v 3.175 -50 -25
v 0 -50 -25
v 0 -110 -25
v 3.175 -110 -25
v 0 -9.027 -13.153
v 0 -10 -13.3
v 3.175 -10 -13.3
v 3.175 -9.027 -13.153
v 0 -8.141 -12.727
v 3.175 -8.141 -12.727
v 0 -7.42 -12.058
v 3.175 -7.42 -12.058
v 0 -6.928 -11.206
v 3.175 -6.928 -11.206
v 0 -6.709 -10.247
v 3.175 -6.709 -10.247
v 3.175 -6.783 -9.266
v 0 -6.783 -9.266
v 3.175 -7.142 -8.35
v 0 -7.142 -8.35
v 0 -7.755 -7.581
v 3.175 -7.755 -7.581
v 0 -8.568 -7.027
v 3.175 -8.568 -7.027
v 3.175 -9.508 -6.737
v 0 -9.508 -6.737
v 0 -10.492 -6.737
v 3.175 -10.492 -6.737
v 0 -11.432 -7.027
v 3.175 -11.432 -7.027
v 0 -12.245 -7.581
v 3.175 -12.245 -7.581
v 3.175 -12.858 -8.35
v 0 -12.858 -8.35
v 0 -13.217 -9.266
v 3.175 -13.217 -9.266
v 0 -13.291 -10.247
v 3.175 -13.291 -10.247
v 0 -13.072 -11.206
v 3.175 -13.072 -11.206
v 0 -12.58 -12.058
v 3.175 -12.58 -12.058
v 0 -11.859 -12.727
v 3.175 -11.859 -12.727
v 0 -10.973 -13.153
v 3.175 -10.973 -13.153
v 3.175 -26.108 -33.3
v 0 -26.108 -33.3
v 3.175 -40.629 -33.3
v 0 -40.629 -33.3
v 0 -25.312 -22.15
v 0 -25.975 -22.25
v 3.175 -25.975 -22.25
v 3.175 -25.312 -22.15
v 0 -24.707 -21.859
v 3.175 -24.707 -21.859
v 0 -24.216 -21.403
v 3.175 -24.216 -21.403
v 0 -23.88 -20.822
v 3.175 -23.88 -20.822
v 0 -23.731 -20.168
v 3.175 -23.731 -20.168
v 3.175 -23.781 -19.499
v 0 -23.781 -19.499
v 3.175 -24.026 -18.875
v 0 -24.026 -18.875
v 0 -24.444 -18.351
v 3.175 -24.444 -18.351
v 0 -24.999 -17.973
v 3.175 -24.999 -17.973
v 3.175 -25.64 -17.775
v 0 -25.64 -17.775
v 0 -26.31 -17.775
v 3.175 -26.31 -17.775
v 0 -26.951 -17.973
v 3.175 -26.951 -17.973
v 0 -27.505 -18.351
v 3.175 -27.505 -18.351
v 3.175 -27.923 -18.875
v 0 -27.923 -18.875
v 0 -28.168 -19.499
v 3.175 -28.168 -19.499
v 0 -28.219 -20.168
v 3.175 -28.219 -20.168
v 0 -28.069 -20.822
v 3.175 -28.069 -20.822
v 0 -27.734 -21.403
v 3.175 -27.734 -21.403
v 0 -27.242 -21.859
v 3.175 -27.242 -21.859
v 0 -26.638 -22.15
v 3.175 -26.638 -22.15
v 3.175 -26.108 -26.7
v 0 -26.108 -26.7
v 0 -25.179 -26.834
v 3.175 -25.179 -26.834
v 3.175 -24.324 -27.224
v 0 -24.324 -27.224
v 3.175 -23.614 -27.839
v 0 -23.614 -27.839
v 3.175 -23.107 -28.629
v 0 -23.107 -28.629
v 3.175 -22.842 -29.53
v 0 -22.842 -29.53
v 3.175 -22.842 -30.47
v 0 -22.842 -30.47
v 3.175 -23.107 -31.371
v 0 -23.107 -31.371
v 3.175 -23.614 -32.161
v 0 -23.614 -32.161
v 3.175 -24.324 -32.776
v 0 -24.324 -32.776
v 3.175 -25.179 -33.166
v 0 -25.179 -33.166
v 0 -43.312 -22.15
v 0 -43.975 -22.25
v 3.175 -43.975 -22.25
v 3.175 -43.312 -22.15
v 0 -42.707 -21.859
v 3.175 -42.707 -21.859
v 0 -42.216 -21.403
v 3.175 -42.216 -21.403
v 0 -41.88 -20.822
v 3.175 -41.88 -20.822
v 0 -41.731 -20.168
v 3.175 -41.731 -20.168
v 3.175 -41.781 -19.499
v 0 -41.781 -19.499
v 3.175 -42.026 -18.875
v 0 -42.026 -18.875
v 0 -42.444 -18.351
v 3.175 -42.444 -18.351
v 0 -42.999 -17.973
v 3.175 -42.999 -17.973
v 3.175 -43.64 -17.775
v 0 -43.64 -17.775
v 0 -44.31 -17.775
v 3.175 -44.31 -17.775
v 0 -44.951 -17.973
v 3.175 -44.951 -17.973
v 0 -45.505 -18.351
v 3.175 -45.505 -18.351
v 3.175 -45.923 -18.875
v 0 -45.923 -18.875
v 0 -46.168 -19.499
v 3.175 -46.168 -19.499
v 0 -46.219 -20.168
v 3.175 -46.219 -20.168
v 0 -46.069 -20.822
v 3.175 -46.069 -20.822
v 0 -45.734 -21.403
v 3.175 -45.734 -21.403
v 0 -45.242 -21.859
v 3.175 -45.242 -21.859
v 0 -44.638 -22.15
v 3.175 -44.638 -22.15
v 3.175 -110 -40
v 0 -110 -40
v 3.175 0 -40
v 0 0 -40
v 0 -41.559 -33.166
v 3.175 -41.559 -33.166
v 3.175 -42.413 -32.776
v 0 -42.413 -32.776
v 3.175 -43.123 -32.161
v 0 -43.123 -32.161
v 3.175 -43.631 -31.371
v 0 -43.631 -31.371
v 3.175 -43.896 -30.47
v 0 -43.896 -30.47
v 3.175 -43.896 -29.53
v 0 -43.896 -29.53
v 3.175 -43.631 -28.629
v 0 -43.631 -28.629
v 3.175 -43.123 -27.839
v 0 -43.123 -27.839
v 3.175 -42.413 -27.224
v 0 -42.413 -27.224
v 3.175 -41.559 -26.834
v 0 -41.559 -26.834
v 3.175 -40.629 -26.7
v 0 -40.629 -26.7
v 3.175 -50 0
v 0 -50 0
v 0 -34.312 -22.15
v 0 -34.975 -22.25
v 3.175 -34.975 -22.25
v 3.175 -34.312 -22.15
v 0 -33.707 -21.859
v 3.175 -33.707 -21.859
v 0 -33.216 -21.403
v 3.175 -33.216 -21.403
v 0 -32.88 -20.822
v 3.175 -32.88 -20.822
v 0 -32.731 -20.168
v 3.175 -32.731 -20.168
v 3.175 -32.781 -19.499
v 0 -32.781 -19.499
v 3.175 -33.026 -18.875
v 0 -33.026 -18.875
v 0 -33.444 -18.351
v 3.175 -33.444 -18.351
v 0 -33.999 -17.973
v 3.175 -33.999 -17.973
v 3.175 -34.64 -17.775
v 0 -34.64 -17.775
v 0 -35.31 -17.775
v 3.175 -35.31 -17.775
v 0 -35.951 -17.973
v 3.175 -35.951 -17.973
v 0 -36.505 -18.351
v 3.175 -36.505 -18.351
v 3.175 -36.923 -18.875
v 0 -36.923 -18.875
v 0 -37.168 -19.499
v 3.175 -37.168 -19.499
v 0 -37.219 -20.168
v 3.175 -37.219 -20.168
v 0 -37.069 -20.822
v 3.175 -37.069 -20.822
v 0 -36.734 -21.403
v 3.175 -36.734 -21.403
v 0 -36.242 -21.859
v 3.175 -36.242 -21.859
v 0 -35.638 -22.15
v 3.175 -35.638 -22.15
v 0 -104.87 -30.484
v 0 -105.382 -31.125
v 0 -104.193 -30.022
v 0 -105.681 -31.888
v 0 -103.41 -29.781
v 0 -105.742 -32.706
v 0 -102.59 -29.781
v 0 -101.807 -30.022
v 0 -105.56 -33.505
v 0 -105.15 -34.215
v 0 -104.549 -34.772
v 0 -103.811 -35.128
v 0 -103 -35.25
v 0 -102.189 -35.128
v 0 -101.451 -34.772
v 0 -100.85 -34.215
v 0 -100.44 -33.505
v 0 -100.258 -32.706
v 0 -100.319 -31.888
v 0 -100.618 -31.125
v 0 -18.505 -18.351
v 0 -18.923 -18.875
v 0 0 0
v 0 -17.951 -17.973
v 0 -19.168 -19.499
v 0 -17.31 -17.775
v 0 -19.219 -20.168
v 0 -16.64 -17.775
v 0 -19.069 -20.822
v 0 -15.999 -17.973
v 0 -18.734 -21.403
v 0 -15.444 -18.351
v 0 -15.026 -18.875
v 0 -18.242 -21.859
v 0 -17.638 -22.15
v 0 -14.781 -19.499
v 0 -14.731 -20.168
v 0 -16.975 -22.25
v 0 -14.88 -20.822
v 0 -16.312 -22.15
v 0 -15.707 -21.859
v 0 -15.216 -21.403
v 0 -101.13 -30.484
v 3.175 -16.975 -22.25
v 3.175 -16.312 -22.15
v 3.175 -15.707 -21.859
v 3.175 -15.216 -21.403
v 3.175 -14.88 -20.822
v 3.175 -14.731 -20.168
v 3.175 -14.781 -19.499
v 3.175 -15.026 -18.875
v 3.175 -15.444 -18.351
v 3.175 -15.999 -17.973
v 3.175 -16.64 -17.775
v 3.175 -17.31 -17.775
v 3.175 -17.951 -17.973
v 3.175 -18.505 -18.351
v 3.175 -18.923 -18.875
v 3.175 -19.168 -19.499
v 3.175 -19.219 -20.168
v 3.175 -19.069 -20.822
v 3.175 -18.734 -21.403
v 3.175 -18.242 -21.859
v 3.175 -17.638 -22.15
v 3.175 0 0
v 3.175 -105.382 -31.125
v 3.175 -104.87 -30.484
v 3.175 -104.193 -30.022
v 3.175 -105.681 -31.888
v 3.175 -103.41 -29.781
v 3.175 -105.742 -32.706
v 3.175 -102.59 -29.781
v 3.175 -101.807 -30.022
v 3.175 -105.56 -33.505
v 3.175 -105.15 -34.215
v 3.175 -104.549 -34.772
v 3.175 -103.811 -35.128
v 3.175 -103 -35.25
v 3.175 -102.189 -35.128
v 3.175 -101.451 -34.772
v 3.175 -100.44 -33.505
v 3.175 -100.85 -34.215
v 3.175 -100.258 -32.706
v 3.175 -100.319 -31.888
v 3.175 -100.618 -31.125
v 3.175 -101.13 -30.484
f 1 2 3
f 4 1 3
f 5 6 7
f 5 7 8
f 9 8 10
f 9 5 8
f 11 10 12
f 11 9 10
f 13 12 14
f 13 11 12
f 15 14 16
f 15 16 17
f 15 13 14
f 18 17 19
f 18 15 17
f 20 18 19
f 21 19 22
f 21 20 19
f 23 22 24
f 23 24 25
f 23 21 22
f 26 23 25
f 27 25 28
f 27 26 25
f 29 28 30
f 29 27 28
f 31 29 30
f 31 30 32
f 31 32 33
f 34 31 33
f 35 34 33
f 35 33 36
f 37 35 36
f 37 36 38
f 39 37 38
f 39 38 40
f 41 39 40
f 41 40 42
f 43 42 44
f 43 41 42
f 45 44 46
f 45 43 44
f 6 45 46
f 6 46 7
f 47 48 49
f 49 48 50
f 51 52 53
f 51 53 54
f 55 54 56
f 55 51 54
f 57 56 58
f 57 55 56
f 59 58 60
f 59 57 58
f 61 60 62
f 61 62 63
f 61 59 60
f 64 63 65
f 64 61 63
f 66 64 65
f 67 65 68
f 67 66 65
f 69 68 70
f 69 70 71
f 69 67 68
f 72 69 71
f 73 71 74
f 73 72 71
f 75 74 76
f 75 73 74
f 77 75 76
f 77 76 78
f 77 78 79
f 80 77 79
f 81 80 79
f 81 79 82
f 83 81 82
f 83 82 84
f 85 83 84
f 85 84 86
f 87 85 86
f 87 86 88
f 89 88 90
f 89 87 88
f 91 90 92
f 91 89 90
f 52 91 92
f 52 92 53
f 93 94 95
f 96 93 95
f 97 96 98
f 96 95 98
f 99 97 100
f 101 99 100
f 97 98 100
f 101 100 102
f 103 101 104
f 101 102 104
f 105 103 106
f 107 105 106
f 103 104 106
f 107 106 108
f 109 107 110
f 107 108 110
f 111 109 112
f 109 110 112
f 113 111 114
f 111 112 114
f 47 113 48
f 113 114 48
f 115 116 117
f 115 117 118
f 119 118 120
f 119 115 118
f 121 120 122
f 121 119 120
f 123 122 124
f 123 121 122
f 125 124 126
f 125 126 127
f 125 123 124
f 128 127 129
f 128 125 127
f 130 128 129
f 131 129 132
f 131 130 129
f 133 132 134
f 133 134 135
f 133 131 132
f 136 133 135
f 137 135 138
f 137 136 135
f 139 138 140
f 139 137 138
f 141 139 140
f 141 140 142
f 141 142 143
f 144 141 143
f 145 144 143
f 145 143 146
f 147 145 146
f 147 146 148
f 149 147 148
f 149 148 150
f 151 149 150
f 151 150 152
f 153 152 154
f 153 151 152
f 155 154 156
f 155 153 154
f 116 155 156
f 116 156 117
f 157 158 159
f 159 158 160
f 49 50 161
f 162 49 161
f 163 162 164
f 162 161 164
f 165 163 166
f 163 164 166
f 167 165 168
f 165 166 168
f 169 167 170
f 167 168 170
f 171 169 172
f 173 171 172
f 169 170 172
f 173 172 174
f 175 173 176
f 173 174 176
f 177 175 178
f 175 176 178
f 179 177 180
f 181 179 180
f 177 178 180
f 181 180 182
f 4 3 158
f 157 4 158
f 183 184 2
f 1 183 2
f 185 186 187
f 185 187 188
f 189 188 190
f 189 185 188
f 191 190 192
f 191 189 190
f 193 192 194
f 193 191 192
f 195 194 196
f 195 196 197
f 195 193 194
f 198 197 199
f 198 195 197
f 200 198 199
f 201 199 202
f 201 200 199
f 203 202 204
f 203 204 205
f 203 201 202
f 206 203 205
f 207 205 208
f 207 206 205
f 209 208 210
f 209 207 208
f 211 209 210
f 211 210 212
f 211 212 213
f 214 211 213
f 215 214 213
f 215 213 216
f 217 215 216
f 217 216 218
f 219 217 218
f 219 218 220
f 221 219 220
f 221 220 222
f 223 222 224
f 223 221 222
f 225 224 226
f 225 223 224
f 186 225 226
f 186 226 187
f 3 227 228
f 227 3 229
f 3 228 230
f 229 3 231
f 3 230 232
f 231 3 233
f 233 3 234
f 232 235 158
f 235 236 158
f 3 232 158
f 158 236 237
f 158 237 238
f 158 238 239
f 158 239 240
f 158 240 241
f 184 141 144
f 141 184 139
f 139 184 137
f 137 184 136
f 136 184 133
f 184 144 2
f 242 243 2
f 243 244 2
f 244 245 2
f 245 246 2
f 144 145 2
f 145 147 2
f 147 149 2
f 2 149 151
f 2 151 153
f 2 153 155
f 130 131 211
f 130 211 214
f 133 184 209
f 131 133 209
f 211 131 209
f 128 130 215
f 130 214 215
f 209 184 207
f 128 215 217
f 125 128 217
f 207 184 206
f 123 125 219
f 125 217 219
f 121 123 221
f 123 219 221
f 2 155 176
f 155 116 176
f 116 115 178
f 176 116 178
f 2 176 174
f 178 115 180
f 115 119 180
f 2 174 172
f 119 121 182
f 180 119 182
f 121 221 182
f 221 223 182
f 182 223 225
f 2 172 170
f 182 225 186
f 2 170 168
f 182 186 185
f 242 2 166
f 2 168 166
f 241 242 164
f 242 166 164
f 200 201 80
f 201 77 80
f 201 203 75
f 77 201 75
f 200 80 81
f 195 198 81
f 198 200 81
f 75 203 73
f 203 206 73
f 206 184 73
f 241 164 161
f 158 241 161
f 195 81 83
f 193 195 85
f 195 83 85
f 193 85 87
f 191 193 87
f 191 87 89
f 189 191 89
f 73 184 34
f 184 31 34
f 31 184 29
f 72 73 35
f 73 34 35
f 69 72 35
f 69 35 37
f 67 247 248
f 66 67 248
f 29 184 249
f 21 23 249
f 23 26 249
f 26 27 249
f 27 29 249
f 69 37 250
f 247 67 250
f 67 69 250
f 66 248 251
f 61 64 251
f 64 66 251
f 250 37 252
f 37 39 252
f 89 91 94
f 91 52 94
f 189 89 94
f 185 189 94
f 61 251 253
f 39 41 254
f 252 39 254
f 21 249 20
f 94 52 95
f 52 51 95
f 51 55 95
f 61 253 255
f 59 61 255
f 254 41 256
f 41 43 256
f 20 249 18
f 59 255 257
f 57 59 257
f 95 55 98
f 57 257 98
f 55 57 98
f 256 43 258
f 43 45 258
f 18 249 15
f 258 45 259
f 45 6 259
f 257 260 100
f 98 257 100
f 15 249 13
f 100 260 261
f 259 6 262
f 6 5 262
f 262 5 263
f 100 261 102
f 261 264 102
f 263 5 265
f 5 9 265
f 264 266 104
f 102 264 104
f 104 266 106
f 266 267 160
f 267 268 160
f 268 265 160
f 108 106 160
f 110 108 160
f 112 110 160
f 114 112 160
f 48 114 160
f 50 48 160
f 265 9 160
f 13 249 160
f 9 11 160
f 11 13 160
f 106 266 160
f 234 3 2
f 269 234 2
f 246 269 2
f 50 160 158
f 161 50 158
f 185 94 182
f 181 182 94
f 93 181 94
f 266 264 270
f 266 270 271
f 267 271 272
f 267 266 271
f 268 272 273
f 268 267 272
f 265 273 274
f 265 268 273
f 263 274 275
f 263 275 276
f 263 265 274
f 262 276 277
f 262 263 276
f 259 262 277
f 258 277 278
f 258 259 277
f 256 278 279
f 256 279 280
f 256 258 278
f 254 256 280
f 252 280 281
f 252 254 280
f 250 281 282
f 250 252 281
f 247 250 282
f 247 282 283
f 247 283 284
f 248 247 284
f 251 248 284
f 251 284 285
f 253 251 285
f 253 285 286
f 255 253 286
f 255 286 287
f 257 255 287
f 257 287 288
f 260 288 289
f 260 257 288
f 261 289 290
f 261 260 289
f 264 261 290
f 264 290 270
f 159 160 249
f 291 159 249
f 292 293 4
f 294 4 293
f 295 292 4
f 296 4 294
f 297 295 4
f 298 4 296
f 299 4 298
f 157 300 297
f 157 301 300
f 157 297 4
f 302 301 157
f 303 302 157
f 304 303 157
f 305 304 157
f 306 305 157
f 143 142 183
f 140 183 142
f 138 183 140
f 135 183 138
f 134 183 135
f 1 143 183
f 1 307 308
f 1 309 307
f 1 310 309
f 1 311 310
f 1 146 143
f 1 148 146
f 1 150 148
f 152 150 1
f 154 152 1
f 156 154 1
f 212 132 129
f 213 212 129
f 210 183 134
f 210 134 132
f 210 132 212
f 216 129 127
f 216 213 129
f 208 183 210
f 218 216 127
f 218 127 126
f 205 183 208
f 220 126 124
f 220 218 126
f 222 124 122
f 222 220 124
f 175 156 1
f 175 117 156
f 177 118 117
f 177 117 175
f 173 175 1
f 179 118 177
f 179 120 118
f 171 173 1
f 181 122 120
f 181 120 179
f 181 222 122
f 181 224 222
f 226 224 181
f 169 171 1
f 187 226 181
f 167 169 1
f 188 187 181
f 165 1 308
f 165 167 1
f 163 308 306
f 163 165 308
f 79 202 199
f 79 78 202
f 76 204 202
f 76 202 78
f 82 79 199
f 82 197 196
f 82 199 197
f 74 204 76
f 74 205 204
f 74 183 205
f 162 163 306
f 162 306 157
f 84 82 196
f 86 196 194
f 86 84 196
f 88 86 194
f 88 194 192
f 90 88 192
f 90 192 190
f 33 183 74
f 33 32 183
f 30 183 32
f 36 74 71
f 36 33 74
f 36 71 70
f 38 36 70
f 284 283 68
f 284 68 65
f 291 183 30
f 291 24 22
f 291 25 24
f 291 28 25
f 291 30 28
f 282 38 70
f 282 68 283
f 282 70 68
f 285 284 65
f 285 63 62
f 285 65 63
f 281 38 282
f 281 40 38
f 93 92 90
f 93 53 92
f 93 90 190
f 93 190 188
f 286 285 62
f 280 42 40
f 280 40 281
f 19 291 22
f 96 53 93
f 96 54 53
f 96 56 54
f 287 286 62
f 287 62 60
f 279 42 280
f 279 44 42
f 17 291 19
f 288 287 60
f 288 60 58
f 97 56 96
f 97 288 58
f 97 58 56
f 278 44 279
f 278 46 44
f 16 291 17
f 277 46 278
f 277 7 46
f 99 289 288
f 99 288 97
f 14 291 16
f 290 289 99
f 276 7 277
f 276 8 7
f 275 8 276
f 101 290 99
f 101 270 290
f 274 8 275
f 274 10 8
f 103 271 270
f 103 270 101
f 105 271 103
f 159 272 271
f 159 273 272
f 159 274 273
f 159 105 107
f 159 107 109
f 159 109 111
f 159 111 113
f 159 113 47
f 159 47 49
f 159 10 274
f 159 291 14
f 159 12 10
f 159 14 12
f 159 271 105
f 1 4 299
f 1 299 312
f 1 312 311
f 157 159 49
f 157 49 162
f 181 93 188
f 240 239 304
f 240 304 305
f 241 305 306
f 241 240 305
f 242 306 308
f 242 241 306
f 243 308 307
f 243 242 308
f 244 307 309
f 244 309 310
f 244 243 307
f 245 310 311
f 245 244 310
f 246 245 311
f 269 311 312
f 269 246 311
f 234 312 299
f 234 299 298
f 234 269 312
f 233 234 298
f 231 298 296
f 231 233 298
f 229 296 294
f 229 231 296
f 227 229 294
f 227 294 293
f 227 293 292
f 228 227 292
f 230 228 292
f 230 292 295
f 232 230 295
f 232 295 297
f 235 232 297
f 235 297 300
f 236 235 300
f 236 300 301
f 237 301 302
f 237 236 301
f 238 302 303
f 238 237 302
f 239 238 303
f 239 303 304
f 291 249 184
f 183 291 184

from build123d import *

# Parameters (mm, degrees)
SKETCH1_R           = 3.3
SKETCH1_R_2         = 2.25
SKETCH1_R_3         = 2.75
BOSS_EXTRUDE1_DEPTH = 3.175


with BuildPart() as part:
    # Sketch1 → Boss-Extrude1 (new body)
    with BuildSketch(Plane(origin=(0, 0, 0), x_dir=(0, 0, -1), z_dir=(1, 0, 0))):
        Polygon((40, 0), (0, 0), (0, -50), (25, -50), (25, -110), (40, -110), (40, -50), align=None)
        with Locations((10, -10)):
            Circle(SKETCH1_R, mode=Mode.SUBTRACT)
        with Locations((20, -16.974849628)):
            Circle(SKETCH1_R_2, mode=Mode.SUBTRACT)
        with Locations((20, -25.974849628)):
            Circle(SKETCH1_R_2, mode=Mode.SUBTRACT)
        with Locations((20, -34.974849628)):
            Circle(SKETCH1_R_2, mode=Mode.SUBTRACT)
        with Locations((20, -43.974849628)):
            Circle(SKETCH1_R_2, mode=Mode.SUBTRACT)
        with Locations((32.5, -103)):
            Circle(SKETCH1_R_3, mode=Mode.SUBTRACT)
        with BuildLine():
            Line((33.3, -26.108433688), (33.3, -40.629208547))
            ThreePointArc((33.3, -40.629208547), (30, -43.929208547), (26.7, -40.629208547))
            Line((26.7, -40.629208547), (26.7, -26.108433688))
            ThreePointArc((26.7, -26.108433688), (30, -22.808433688), (33.3, -26.108433688))
        make_face(mode=Mode.SUBTRACT)
    extrude(amount=BOSS_EXTRUDE1_DEPTH)


solid = part.part
